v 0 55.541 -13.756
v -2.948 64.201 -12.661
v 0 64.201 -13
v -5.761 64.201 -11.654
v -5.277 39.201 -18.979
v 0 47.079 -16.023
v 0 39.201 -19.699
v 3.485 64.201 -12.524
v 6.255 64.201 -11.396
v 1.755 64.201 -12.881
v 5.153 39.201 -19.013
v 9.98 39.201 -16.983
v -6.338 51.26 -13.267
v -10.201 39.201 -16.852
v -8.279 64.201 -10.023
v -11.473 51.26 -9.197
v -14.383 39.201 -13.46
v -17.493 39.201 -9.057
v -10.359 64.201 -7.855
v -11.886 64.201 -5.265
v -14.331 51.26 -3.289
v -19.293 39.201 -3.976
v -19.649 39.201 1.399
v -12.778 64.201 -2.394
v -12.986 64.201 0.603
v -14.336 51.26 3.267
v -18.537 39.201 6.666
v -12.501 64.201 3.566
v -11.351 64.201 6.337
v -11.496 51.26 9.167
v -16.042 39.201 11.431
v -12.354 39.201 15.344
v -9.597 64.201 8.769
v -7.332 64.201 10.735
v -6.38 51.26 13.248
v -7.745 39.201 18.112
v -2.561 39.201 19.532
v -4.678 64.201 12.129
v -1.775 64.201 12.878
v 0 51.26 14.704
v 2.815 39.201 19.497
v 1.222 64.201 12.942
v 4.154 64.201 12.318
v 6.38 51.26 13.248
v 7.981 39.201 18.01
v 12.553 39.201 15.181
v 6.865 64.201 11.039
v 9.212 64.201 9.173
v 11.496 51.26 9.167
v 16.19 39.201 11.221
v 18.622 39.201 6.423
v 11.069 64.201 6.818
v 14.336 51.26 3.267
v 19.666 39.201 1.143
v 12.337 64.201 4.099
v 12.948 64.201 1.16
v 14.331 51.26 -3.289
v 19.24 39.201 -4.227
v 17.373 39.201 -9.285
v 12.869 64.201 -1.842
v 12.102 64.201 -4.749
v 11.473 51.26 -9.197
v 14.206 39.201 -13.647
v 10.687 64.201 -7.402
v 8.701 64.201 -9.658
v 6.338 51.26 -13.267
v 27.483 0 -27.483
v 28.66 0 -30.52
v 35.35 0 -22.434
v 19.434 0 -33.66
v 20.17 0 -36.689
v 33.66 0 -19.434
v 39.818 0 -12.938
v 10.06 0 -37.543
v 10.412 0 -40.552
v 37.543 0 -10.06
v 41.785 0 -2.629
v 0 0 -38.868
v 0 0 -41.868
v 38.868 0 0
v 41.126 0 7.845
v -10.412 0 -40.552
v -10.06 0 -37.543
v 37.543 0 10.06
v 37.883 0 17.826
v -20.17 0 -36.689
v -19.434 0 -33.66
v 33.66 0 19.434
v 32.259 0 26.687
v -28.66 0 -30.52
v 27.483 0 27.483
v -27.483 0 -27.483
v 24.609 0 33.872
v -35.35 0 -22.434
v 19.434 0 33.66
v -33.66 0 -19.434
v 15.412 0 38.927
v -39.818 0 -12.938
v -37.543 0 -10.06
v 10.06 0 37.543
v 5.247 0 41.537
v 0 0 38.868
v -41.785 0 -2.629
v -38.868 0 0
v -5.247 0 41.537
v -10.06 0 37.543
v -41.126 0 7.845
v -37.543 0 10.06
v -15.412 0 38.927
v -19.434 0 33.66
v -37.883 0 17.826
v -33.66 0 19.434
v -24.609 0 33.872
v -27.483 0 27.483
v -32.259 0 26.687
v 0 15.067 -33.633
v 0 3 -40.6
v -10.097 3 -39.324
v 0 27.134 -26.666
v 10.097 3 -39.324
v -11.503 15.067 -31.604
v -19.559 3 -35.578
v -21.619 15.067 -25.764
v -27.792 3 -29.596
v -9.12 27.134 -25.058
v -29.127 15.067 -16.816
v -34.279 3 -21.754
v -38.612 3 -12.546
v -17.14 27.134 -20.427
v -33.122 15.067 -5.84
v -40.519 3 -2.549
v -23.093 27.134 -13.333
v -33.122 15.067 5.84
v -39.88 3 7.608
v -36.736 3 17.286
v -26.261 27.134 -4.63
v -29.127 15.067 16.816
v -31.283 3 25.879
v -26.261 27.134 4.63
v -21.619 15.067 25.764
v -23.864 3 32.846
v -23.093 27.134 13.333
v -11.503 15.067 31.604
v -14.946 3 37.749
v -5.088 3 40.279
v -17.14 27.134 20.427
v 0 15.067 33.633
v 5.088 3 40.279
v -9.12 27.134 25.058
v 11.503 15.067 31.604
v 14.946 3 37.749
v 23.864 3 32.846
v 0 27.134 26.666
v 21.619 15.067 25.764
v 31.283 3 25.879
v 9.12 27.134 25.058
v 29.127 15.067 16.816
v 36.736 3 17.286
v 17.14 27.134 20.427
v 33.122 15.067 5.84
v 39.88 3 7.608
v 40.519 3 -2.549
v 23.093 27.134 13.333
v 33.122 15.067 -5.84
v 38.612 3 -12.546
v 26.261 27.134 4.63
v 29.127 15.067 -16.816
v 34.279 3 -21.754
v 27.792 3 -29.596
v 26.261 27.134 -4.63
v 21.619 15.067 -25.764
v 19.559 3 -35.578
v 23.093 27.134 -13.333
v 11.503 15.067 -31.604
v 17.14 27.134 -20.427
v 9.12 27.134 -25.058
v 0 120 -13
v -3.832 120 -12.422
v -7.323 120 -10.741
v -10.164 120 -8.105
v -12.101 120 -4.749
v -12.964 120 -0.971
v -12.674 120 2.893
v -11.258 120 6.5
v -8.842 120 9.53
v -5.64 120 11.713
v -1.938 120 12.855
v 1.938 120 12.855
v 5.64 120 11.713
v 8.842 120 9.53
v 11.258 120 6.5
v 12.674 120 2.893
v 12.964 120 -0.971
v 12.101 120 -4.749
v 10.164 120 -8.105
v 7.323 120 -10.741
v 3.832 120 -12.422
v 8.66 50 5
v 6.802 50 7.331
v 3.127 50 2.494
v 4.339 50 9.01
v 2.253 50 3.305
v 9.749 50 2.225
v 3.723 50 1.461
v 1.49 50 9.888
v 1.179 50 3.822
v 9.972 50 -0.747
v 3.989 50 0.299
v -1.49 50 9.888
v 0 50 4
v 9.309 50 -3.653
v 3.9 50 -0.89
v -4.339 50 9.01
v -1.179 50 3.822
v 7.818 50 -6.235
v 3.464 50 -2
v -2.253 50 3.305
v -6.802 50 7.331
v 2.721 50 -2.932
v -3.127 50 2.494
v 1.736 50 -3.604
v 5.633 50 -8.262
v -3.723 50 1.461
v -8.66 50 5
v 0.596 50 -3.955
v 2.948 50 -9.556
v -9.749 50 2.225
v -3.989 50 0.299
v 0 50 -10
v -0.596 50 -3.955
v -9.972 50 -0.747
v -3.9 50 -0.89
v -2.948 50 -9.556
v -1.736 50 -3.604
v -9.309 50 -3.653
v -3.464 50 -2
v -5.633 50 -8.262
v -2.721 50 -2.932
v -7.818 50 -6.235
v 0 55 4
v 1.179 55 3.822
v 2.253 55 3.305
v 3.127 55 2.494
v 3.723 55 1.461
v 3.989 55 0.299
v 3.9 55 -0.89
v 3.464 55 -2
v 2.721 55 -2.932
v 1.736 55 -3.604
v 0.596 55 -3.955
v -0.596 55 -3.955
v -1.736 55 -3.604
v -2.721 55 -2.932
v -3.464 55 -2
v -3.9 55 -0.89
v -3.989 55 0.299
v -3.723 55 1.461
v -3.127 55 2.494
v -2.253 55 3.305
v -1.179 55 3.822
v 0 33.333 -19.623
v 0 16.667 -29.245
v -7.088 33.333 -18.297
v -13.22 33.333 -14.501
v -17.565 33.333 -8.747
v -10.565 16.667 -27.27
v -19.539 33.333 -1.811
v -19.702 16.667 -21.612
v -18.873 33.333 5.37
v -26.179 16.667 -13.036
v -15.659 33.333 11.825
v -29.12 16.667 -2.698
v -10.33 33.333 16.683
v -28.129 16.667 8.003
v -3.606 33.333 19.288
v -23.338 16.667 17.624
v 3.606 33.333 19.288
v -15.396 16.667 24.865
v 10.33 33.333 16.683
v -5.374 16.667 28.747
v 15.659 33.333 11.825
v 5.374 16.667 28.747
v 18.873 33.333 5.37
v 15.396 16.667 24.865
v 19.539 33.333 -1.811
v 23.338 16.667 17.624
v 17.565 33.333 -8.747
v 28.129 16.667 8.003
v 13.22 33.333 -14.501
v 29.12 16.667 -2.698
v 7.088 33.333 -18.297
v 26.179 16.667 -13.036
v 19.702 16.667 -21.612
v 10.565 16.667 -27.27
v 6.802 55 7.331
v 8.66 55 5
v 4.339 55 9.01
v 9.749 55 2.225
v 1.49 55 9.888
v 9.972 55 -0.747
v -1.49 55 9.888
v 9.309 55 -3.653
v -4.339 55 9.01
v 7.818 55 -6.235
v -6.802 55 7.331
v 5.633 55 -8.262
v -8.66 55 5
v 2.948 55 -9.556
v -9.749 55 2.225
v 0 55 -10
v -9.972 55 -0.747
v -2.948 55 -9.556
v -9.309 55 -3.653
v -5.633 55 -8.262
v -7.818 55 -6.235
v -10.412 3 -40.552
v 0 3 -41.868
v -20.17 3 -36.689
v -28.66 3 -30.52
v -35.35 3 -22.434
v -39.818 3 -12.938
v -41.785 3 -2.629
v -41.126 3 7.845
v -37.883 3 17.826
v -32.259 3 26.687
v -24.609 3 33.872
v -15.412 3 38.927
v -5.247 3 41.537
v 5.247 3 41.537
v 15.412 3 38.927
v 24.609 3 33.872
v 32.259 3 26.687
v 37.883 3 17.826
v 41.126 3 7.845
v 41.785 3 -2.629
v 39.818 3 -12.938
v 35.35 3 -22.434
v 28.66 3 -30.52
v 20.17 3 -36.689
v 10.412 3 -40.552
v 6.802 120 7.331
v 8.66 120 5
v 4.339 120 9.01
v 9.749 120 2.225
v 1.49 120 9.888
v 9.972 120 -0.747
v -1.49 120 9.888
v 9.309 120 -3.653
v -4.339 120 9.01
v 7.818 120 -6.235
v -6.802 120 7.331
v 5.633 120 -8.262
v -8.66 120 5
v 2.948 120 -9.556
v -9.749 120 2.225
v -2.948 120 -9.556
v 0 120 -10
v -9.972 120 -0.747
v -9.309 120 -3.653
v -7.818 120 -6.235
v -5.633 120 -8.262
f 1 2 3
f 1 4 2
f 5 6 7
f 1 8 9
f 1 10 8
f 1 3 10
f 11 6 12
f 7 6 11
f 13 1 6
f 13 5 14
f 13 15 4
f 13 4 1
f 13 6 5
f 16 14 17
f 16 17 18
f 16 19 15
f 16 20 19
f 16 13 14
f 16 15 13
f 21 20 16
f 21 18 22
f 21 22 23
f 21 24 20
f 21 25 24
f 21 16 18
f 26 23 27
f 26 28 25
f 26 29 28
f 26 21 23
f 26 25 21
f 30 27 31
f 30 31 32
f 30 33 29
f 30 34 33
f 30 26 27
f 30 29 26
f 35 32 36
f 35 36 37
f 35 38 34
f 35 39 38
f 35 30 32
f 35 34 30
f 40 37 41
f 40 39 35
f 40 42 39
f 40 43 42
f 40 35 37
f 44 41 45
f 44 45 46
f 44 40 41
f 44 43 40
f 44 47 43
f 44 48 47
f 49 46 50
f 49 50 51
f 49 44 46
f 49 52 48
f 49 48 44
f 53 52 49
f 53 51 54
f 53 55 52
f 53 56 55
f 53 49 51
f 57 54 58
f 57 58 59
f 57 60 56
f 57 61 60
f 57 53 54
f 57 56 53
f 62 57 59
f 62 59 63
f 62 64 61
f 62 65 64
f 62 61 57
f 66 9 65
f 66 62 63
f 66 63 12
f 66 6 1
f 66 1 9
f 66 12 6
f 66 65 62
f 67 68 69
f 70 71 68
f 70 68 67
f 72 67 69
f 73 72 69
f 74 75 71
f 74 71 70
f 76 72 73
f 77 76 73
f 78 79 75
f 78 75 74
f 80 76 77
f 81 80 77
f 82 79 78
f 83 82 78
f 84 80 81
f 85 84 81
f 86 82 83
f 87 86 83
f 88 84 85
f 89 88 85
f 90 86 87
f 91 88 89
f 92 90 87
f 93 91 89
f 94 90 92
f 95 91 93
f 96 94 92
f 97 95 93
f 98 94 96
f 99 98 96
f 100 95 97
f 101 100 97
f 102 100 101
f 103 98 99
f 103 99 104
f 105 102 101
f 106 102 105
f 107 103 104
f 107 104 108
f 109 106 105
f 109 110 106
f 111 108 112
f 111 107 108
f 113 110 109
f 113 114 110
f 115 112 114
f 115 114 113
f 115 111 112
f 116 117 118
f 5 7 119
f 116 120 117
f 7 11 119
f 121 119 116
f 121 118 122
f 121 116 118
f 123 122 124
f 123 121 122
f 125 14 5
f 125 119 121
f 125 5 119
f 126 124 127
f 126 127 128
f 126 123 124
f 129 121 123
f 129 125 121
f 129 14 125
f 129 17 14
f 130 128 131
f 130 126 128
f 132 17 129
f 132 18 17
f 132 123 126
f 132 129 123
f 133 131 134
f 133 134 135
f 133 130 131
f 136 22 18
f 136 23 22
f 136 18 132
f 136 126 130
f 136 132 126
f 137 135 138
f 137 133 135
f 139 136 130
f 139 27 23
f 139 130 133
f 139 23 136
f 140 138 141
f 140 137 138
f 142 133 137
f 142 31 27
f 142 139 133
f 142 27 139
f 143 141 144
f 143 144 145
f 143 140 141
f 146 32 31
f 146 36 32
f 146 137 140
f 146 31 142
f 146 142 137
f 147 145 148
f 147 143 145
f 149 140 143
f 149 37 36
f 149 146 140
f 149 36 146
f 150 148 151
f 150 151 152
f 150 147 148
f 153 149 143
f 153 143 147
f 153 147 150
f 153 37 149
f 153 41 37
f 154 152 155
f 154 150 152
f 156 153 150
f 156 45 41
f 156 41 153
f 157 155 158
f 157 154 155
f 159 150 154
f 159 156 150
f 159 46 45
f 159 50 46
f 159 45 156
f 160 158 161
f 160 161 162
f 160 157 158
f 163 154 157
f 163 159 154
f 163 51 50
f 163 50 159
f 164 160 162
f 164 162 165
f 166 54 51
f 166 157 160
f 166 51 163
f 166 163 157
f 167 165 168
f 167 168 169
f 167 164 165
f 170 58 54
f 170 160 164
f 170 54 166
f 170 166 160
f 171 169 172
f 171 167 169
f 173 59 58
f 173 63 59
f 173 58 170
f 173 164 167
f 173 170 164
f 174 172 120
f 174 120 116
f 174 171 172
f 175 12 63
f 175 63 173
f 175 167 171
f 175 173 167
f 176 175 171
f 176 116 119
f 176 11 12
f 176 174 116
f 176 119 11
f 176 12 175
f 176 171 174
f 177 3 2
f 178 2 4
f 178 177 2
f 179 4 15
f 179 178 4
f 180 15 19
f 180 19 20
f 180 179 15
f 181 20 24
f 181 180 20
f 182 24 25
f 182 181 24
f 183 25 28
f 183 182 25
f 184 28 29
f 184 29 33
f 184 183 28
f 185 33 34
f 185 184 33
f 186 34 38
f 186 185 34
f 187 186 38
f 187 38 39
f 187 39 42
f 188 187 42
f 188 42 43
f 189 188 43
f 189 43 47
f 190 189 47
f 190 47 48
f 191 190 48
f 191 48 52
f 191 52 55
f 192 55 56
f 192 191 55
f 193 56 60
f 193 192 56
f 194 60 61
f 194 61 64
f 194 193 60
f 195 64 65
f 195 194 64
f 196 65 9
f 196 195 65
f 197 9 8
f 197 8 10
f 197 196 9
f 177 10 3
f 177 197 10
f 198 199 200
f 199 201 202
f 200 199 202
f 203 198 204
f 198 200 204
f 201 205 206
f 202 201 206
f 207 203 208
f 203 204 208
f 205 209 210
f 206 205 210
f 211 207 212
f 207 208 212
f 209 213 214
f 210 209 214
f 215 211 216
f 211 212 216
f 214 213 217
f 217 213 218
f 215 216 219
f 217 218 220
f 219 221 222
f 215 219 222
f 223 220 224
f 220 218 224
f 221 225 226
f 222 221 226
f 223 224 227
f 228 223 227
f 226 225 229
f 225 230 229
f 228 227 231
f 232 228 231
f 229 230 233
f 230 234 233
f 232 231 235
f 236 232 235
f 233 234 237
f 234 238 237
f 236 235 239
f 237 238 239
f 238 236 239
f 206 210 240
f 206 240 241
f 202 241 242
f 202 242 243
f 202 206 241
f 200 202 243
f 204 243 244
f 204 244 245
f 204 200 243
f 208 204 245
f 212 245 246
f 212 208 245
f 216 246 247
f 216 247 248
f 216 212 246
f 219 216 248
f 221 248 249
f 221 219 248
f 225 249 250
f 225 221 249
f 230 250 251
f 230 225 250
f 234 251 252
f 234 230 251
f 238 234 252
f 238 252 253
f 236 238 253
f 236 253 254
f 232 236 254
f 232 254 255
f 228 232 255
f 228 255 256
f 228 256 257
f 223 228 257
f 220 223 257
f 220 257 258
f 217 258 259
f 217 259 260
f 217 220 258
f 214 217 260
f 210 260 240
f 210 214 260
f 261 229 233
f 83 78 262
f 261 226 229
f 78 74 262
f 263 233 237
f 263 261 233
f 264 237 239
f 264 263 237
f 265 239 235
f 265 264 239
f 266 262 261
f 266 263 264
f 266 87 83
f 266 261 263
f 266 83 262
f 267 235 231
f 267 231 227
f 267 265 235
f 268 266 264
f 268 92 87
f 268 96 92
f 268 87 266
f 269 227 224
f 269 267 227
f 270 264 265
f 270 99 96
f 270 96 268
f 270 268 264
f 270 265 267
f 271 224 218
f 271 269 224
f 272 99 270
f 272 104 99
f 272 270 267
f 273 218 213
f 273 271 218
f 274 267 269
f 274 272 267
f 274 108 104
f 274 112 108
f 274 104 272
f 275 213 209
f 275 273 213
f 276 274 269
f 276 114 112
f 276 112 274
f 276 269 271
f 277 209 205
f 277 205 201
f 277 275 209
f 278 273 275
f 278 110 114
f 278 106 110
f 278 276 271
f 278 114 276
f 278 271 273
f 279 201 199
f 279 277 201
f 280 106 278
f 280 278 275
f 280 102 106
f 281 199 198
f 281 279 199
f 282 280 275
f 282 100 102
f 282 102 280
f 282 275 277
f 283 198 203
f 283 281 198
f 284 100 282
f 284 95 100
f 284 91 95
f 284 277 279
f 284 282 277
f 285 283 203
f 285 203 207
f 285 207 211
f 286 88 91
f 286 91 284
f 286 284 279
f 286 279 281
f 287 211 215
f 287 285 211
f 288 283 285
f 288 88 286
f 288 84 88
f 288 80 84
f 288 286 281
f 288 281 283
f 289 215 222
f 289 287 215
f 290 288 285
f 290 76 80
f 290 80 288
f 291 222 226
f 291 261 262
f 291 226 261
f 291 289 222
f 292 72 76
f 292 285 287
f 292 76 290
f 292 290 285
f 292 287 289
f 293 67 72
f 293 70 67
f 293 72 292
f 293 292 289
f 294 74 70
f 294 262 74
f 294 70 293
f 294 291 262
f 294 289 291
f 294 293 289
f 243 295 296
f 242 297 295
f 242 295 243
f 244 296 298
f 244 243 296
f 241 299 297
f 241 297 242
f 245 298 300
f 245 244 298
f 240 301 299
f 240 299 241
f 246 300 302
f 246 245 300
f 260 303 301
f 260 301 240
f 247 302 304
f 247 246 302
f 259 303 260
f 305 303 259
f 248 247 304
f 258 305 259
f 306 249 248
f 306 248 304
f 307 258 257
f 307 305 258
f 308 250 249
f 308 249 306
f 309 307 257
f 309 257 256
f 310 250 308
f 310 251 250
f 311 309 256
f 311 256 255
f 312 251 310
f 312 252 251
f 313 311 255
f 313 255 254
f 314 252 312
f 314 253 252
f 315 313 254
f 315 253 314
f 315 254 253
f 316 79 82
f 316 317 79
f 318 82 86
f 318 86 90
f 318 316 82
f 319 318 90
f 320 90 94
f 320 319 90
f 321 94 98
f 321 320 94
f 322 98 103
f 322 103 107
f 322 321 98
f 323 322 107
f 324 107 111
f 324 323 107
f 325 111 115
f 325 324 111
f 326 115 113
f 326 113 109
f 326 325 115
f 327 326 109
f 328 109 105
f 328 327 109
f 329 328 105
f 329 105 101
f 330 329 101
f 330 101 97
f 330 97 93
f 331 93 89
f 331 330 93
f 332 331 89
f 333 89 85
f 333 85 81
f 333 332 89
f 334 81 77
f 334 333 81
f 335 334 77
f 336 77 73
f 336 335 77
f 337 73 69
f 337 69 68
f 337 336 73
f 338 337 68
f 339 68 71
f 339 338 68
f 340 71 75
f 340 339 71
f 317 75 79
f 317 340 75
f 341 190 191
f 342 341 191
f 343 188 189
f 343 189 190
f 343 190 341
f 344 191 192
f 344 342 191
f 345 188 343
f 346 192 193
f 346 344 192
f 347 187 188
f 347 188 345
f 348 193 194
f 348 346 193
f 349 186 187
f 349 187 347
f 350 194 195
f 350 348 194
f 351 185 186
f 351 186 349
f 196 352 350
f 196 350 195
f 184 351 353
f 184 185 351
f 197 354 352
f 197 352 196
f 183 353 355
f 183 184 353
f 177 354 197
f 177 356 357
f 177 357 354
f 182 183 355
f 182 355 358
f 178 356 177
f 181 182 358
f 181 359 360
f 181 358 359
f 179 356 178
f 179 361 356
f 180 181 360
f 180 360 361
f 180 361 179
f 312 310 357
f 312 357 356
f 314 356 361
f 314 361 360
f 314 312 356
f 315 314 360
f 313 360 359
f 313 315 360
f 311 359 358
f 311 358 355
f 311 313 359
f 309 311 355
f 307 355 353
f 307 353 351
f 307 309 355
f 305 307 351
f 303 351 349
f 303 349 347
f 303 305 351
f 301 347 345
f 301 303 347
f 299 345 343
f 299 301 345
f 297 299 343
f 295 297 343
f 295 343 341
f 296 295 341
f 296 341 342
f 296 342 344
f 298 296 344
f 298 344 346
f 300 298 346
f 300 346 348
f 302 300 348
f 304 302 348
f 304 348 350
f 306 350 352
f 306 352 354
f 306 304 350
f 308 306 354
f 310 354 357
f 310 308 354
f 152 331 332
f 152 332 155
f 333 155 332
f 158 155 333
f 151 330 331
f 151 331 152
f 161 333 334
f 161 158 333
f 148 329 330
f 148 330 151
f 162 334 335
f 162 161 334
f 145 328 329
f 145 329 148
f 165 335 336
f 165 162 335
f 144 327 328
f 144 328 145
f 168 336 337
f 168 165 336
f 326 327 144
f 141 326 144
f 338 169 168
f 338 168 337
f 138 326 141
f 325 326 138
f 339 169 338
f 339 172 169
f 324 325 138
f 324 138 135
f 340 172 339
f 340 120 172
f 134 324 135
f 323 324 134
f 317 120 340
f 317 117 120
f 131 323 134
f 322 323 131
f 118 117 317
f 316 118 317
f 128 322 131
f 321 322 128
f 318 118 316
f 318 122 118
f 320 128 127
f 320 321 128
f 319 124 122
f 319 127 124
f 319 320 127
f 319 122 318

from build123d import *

# Parameters (mm, degrees)
SKETCH_2_R      = 10
SKETCH_2_R_2    = 4
EXTRUDE_1_DEPTH = 5
FILLET_1_R      = 50


with BuildPart() as part:
    # 草图1 → 旋转-薄壁1 (revolve)
    with BuildSketch(Plane.XY, mode=Mode.PRIVATE) as revolve_1_sk:
        Polygon((10, 120), (10, 50), (38.867513459, 0), (41.867513459, 0), (41.867513459, 3), (40.599564267, 3), (13, 50.803847577), (13, 120), align=None)
    revolve(revolve_1_sk.sketch.rotate(Axis((0, 0, 0), (0, 1, 0)), 90), axis=Axis((0, 0, 0), (0, 1, 0)))

    # 草图2 → 凸台-拉伸1 (add)
    with BuildSketch(Plane(origin=(0, 50, 0), x_dir=(1, 0, 0), z_dir=(0, 1, 0))):
        with Locations(Location((0, 0, 0), (0, 0, 90))):
            Circle(SKETCH_2_R)
        with Locations(Location((0, 0, 0), (0, 0, 270))):
            Circle(SKETCH_2_R_2, mode=Mode.SUBTRACT)
    extrude(amount=EXTRUDE_1_DEPTH)

    # 圆角1
    fillet_1_edges = [part.edges().sort_by_distance(p)[0] for p in [
        (0, 50.803847577, 13),
    ]]
    fillet(fillet_1_edges, radius=FILLET_1_R)


solid = part.part
